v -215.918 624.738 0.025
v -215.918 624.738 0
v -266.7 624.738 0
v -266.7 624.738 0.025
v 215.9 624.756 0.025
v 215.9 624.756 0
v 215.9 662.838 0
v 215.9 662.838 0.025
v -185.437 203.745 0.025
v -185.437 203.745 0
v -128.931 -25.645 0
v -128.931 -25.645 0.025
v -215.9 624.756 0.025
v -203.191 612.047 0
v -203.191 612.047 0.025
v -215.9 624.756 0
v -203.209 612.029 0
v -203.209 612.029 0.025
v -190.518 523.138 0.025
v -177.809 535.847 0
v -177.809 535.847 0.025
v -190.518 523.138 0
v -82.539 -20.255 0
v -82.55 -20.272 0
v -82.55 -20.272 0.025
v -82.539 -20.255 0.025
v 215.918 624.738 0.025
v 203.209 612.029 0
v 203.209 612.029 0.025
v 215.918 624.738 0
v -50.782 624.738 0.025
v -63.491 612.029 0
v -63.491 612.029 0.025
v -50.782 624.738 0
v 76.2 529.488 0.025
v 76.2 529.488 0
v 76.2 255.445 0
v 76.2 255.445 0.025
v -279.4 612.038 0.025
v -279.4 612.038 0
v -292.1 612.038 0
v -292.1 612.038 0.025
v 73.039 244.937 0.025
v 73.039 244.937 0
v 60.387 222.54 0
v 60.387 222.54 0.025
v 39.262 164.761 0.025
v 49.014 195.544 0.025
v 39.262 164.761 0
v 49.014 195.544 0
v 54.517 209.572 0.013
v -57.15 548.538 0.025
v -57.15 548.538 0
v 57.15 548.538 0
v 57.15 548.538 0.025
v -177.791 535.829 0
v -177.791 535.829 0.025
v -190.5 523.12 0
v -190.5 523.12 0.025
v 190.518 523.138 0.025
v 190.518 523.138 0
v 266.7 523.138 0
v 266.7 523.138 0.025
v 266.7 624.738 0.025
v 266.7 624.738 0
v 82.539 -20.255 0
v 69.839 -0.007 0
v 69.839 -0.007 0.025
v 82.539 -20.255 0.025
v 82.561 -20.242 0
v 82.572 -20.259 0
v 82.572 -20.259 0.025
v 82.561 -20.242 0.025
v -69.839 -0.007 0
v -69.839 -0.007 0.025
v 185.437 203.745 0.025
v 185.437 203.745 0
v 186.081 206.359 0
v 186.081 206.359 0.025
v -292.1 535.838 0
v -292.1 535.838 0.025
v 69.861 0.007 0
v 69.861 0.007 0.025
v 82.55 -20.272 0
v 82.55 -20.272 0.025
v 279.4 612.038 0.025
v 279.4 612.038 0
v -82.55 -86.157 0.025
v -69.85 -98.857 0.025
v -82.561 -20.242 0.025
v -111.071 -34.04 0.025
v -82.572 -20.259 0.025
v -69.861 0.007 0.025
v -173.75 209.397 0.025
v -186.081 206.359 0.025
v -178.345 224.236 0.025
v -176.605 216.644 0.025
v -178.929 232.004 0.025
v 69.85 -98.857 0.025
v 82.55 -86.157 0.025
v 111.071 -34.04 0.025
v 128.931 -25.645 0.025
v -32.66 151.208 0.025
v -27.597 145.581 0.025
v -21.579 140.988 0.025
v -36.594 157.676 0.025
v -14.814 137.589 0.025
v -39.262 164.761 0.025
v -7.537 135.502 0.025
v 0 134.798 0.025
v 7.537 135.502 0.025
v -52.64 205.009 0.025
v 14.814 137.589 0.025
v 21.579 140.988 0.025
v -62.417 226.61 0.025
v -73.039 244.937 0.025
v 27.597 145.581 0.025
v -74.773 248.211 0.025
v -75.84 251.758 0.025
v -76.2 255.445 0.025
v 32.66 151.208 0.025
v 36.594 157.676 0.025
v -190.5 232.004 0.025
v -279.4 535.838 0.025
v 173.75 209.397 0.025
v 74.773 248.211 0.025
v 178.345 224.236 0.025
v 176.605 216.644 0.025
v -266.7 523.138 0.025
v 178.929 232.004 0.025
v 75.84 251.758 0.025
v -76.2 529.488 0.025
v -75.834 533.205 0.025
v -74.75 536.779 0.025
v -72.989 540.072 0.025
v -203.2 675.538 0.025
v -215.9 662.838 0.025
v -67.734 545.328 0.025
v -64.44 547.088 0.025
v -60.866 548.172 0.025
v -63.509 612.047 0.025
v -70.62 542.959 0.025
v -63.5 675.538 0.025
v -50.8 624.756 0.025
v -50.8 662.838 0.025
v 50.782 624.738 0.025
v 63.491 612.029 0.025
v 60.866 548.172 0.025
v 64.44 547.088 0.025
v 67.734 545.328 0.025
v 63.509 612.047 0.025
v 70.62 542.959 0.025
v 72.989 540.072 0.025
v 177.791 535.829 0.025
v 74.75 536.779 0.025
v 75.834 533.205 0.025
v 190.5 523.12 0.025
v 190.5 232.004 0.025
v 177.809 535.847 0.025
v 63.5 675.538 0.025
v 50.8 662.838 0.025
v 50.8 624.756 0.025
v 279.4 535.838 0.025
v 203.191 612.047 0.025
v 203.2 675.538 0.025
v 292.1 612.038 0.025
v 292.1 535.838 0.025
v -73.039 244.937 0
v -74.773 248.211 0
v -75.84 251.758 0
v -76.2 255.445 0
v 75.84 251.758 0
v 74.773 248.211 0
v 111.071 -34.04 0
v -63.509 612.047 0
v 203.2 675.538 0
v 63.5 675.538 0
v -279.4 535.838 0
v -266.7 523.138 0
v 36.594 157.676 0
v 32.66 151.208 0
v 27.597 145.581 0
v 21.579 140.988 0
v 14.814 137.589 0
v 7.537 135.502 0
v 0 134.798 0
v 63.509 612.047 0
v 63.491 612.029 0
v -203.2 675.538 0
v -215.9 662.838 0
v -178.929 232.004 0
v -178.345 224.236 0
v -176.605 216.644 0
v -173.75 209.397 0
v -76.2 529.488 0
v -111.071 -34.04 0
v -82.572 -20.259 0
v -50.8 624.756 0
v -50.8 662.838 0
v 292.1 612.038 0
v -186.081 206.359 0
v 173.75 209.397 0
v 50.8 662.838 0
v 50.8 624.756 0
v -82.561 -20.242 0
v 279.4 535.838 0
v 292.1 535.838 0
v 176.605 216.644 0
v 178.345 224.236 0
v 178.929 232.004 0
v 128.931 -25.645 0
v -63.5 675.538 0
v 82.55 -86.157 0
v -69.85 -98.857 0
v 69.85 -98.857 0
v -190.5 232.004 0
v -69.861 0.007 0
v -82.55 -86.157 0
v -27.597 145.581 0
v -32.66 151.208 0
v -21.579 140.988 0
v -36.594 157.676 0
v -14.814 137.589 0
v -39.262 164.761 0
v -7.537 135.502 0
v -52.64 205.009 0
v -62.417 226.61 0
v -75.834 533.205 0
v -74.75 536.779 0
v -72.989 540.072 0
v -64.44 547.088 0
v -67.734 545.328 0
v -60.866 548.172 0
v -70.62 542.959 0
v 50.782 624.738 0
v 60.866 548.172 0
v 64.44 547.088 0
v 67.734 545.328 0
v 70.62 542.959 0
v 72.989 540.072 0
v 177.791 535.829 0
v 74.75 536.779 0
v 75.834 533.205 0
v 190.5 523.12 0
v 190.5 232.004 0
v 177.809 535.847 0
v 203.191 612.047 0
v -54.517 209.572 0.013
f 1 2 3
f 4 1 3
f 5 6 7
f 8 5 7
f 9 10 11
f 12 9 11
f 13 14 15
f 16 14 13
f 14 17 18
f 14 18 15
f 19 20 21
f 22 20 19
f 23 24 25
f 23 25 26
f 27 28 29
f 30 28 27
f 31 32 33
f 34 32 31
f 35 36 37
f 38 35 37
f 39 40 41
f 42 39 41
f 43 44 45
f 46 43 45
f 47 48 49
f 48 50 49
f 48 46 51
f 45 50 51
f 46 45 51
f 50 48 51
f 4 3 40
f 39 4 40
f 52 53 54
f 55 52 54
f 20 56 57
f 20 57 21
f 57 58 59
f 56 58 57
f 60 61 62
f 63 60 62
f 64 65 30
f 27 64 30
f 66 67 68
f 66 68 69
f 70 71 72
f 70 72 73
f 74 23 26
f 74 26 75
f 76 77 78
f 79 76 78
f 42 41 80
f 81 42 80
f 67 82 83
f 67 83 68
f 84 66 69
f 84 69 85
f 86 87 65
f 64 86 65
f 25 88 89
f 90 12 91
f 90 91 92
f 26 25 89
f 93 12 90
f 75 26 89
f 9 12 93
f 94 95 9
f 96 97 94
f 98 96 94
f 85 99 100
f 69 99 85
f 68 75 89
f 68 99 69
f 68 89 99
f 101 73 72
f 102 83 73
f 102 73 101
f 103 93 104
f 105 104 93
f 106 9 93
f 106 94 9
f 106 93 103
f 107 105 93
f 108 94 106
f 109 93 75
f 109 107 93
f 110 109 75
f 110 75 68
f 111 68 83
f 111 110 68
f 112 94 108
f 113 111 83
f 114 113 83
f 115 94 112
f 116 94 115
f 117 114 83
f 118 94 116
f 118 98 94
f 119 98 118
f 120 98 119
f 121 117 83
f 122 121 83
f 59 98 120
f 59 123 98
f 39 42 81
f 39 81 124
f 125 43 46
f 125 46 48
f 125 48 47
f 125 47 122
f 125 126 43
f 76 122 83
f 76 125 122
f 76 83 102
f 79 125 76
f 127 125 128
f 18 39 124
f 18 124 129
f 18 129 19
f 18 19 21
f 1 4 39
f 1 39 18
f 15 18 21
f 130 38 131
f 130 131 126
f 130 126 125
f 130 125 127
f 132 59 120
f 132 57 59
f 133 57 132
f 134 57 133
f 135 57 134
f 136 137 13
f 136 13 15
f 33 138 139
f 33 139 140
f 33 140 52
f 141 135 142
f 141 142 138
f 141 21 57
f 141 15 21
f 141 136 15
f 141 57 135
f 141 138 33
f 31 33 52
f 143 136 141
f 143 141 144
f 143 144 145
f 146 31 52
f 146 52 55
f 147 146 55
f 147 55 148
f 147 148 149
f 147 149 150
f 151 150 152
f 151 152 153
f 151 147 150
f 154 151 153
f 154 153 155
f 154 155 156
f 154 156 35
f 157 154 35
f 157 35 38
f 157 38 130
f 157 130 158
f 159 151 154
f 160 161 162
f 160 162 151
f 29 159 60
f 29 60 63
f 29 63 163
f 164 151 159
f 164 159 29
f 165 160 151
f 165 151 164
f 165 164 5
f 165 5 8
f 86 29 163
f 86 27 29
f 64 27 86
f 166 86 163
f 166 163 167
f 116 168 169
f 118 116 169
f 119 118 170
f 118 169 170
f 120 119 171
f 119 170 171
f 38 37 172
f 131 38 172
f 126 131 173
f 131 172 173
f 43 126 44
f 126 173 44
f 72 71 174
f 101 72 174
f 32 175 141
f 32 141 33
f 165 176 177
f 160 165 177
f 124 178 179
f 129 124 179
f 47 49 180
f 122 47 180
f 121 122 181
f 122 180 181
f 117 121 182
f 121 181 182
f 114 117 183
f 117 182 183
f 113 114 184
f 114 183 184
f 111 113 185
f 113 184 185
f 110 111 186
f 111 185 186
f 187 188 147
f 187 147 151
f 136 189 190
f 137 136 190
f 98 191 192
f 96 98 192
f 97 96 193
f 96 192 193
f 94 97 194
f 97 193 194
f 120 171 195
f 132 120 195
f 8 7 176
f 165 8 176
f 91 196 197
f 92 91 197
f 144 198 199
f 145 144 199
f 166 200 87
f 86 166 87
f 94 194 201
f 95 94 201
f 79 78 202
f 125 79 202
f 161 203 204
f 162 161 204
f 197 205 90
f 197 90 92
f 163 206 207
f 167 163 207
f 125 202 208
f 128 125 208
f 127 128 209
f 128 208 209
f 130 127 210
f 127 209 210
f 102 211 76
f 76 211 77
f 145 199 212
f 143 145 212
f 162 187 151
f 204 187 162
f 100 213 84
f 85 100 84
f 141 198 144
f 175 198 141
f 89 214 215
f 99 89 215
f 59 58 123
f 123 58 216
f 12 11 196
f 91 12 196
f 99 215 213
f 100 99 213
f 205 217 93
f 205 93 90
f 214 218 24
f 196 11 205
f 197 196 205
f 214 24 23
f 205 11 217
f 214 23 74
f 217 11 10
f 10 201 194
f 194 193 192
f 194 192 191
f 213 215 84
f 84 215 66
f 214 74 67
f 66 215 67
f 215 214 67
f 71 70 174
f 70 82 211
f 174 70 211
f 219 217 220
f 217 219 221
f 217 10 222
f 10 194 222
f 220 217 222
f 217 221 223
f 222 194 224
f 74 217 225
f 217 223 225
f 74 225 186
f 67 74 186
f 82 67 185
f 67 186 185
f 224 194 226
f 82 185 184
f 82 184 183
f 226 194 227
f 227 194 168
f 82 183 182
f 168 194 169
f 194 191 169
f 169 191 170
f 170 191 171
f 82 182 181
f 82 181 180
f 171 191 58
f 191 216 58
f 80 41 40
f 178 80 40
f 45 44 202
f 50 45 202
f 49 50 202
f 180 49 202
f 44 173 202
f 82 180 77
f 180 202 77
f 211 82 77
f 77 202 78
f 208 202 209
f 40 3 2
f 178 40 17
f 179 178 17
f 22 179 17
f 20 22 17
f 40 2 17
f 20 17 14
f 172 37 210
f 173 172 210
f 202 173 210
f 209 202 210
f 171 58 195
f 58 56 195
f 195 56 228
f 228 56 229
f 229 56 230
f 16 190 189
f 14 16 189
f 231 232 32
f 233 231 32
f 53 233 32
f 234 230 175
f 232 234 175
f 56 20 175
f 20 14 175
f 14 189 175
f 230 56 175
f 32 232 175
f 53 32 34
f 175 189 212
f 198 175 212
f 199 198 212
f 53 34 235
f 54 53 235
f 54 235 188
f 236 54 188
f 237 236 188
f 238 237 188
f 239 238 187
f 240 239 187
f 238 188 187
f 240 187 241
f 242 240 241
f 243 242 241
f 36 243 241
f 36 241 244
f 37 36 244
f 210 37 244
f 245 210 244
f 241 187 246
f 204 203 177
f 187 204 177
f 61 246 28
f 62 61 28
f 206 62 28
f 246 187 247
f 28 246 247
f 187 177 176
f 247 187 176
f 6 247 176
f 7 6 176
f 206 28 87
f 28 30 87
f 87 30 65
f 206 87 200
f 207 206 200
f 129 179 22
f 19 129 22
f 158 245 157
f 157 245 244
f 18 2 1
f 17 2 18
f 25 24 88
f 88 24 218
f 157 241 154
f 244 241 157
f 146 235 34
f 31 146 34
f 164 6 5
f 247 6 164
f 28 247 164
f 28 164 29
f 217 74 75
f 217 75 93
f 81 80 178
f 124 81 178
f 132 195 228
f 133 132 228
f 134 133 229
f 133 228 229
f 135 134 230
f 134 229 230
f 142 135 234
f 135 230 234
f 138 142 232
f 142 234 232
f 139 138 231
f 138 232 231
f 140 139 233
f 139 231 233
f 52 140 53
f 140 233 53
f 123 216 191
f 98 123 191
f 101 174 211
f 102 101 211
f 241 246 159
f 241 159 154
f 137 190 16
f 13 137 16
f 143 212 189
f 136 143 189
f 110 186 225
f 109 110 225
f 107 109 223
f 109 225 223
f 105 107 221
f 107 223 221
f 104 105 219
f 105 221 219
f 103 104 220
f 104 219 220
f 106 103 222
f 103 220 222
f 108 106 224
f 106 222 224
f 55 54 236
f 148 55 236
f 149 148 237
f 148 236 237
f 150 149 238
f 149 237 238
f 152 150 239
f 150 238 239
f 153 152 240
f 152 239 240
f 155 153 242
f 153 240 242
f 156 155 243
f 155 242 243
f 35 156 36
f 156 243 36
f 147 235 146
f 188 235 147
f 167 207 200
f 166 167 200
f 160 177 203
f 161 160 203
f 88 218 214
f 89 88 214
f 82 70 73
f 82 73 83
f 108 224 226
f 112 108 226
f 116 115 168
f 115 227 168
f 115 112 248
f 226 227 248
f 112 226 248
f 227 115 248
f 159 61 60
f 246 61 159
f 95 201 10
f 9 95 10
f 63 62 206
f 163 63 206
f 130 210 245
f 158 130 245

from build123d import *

# Parameters (mm, degrees)
F1_DEPTH = 0.0254
F3_DEPTH = 0.0264001


with BuildPart() as f1:
    # F0 (on Top) → F1 (new body)
    with BuildSketch(Plane.XY):
        with BuildLine():
            Line((-266.7, 523.1384), (-190.5, 523.1384))
            Line((-190.5, 523.1384), (-190.5, 232.0036))
            Line((-190.5, 232.0036), (-178.928937776, 232.0036))
            ThreePointArc((-178.928937776, 232.0036), (-177.6175752012, 220.4072359452), (-173.7497192111, 209.3965583486))
            Line((-173.7497192111, 209.3965583486), (-186.0810970216, 206.3589406484))
            Line((-186.0810970216, 206.3589406484), (-185.4371490138, 203.7447979358))
            Line((-185.4371490138, 203.7447979358), (-128.9310970216, -25.6446593516))
            Line((-128.9310970216, -25.6446593516), (-111.0708283601, -34.0403861296))
            Line((-111.0708283601, -34.0403861296), (-82.55, -20.2483983797))
            Line((-82.55, -20.2483983797), (-82.55, -86.1568))
            Line((-82.55, -86.1568), (-69.85, -98.8568))
            Line((-69.85, -98.8568), (0, -98.8568))
            Line((0, -98.8568), (69.85, -98.8568))
            Line((69.85, -98.8568), (82.55, -86.1568))
            Line((82.55, -86.1568), (82.55, -20.2483983797))
            Line((82.55, -20.2483983797), (111.0708283601, -34.0403861296))
            Line((111.0708283601, -34.0403861296), (128.9310970216, -25.6446593516))
            Line((128.9310970216, -25.6446593516), (185.4371490138, 203.7447979358))
            Line((185.4371490138, 203.7447979358), (186.0810970216, 206.3589406484))
            Line((186.0810970216, 206.3589406484), (173.7497192111, 209.3965583486))
            ThreePointArc((173.7497192111, 209.3965583486), (177.6175752012, 220.4072359452), (178.928937776, 232.0036))
            Line((178.928937776, 232.0036), (190.5, 232.0036))
            Line((190.5, 232.0036), (190.5, 523.1384))
            Line((190.5, 523.1384), (266.7, 523.1384))
            Line((266.7, 523.1384), (279.4, 535.8384))
            Line((279.4, 535.8384), (292.1, 535.8384))
            Line((292.1, 535.8384), (292.1, 612.0384))
            Line((292.1, 612.0384), (279.4, 612.0384))
            Line((279.4, 612.0384), (266.7, 624.7384))
            Line((266.7, 624.7384), (215.9, 624.7384))
            Line((215.9, 624.7384), (215.9, 662.8384))
            Line((215.9, 662.8384), (203.2, 675.5384))
            Line((203.2, 675.5384), (127, 675.5384))
            Line((127, 675.5384), (63.5, 675.5384))
            Line((63.5, 675.5384), (50.8, 662.8384))
            Line((50.8, 662.8384), (50.8, 624.7384))
            Line((50.8, 624.7384), (0, 624.7384))
            Line((0, 624.7384), (-50.8, 624.7384))
            Line((-50.8, 624.7384), (-50.8, 662.8384))
            Line((-50.8, 662.8384), (-63.5, 675.5384))
            Line((-63.5, 675.5384), (-127, 675.5384))
            Line((-127, 675.5384), (-203.2, 675.5384))
            Line((-203.2, 675.5384), (-215.9, 662.8384))
            Line((-215.9, 662.8384), (-215.9, 624.7384))
            Line((-215.9, 624.7384), (-266.7, 624.7384))
            Line((-266.7, 624.7384), (-279.4, 612.0384))
            Line((-279.4, 612.0384), (-292.1, 612.0384))
            Line((-292.1, 612.0384), (-292.1, 535.8384))
            Line((-292.1, 535.8384), (-279.4, 535.8384))
            Line((-279.4, 535.8384), (-266.7, 523.1384))
        make_face()
        with BuildLine():
            ThreePointArc((39.2624389008, 164.7605591868), (24.6946656513, 143.1441682497), (0, 134.7978))
            ThreePointArc((0, 134.7978), (-24.6946656513, 143.1441682497), (-39.2624389008, 164.7605591868))
            add(Edge.make_bspline(
                [(-39.2624389008, 164.7605591868), (-52.8458419076, 214.4044098408), (-73.0392225397, 244.9366100052)],
                knots=[5.3343094377, 5.3343094377, 5.3343094377, 5.7597386581, 5.7597386581, 5.7597386581], degree=2, weights=[1, 0.9774614244, 1]))
            ThreePointArc((-73.0392225397, 244.9366100052), (-75.3926997643, 249.9584905228), (-76.2, 255.4454209315))
            Line((-76.2, 255.4454209315), (-76.2, 472.3384))
            Line((-76.2, 472.3384), (-76.2, 529.4884))
            ThreePointArc((-76.2, 529.4884), (-70.6203841816, 542.9587841816), (-57.15, 548.5384))
            Line((-57.15, 548.5384), (0, 548.5384))
            Line((0, 548.5384), (57.15, 548.5384))
            ThreePointArc((57.15, 548.5384), (70.6203841816, 542.9587841816), (76.2, 529.4884))
            Line((76.2, 529.4884), (76.2, 472.3384))
            Line((76.2, 472.3384), (76.2, 255.4454209315))
            ThreePointArc((76.2, 255.4454209315), (75.3926997643, 249.9584905228), (73.0392225397, 244.9366100052))
            add(Edge.make_bspline(
                [(73.0392225397, 244.9366100052), (52.8458419076, 214.4044098408), (39.2624389008, 164.7605591868)],
                knots=[0.5234466491, 0.5234466491, 0.5234466491, 0.9488758695, 0.9488758695, 0.9488758695], degree=2, weights=[1, 0.9774614244, 1]))
        make_face(mode=Mode.SUBTRACT)
    extrude(amount=F1_DEPTH)

    # F2 (on Top) → F3 (cut, through all)
    with BuildSketch(Plane.XY):
        Polygon((-203.1910197439, 612.0473802561), (-215.9, 624.7563605122), (-215.9179605122, 624.7384), (-203.2089802561, 612.0294197439), align=None)
        Polygon((-50.7820394878, 624.7384), (-50.8, 624.7563605122), (-63.5089802561, 612.0473802561), (-63.4910197439, 612.0294197439), align=None)
        Polygon((-69.8607588781, 0.006748077), (-82.5607588781, -20.2416503028), (-82.5715177561, -20.2588038499), (-82.55, -20.2723000039), (-82.5392411219, -20.2551464567), (-69.8392411219, -0.006748077), align=None)
        Polygon((50.8, 624.7563605122), (50.7820394878, 624.7384), (63.4910197439, 612.0294197439), (63.5089802561, 612.0473802561), align=None)
        Polygon((215.9, 624.7563605122), (203.1910197439, 612.0473802561), (203.2089802561, 612.0294197439), (215.9179605122, 624.7384), align=None)
        Polygon((82.5607588781, -20.2416503028), (69.8607588781, 0.006748077), (69.8392411219, -0.006748077), (82.5392411219, -20.2551464567), (82.55, -20.2723000039), (82.5715177561, -20.2588038499), align=None)
        Polygon((-177.8089802561, 535.8473802561), (-190.5179605122, 523.1384), (-190.5, 523.1204394878), (-177.7910197439, 535.8294197439), align=None)
        Polygon((190.5, 523.1204394878), (190.5179605122, 523.1384), (177.8089802561, 535.8473802561), (177.7910197439, 535.8294197439), align=None)
    extrude(amount=F3_DEPTH, mode=Mode.SUBTRACT)


solid = f1.part
